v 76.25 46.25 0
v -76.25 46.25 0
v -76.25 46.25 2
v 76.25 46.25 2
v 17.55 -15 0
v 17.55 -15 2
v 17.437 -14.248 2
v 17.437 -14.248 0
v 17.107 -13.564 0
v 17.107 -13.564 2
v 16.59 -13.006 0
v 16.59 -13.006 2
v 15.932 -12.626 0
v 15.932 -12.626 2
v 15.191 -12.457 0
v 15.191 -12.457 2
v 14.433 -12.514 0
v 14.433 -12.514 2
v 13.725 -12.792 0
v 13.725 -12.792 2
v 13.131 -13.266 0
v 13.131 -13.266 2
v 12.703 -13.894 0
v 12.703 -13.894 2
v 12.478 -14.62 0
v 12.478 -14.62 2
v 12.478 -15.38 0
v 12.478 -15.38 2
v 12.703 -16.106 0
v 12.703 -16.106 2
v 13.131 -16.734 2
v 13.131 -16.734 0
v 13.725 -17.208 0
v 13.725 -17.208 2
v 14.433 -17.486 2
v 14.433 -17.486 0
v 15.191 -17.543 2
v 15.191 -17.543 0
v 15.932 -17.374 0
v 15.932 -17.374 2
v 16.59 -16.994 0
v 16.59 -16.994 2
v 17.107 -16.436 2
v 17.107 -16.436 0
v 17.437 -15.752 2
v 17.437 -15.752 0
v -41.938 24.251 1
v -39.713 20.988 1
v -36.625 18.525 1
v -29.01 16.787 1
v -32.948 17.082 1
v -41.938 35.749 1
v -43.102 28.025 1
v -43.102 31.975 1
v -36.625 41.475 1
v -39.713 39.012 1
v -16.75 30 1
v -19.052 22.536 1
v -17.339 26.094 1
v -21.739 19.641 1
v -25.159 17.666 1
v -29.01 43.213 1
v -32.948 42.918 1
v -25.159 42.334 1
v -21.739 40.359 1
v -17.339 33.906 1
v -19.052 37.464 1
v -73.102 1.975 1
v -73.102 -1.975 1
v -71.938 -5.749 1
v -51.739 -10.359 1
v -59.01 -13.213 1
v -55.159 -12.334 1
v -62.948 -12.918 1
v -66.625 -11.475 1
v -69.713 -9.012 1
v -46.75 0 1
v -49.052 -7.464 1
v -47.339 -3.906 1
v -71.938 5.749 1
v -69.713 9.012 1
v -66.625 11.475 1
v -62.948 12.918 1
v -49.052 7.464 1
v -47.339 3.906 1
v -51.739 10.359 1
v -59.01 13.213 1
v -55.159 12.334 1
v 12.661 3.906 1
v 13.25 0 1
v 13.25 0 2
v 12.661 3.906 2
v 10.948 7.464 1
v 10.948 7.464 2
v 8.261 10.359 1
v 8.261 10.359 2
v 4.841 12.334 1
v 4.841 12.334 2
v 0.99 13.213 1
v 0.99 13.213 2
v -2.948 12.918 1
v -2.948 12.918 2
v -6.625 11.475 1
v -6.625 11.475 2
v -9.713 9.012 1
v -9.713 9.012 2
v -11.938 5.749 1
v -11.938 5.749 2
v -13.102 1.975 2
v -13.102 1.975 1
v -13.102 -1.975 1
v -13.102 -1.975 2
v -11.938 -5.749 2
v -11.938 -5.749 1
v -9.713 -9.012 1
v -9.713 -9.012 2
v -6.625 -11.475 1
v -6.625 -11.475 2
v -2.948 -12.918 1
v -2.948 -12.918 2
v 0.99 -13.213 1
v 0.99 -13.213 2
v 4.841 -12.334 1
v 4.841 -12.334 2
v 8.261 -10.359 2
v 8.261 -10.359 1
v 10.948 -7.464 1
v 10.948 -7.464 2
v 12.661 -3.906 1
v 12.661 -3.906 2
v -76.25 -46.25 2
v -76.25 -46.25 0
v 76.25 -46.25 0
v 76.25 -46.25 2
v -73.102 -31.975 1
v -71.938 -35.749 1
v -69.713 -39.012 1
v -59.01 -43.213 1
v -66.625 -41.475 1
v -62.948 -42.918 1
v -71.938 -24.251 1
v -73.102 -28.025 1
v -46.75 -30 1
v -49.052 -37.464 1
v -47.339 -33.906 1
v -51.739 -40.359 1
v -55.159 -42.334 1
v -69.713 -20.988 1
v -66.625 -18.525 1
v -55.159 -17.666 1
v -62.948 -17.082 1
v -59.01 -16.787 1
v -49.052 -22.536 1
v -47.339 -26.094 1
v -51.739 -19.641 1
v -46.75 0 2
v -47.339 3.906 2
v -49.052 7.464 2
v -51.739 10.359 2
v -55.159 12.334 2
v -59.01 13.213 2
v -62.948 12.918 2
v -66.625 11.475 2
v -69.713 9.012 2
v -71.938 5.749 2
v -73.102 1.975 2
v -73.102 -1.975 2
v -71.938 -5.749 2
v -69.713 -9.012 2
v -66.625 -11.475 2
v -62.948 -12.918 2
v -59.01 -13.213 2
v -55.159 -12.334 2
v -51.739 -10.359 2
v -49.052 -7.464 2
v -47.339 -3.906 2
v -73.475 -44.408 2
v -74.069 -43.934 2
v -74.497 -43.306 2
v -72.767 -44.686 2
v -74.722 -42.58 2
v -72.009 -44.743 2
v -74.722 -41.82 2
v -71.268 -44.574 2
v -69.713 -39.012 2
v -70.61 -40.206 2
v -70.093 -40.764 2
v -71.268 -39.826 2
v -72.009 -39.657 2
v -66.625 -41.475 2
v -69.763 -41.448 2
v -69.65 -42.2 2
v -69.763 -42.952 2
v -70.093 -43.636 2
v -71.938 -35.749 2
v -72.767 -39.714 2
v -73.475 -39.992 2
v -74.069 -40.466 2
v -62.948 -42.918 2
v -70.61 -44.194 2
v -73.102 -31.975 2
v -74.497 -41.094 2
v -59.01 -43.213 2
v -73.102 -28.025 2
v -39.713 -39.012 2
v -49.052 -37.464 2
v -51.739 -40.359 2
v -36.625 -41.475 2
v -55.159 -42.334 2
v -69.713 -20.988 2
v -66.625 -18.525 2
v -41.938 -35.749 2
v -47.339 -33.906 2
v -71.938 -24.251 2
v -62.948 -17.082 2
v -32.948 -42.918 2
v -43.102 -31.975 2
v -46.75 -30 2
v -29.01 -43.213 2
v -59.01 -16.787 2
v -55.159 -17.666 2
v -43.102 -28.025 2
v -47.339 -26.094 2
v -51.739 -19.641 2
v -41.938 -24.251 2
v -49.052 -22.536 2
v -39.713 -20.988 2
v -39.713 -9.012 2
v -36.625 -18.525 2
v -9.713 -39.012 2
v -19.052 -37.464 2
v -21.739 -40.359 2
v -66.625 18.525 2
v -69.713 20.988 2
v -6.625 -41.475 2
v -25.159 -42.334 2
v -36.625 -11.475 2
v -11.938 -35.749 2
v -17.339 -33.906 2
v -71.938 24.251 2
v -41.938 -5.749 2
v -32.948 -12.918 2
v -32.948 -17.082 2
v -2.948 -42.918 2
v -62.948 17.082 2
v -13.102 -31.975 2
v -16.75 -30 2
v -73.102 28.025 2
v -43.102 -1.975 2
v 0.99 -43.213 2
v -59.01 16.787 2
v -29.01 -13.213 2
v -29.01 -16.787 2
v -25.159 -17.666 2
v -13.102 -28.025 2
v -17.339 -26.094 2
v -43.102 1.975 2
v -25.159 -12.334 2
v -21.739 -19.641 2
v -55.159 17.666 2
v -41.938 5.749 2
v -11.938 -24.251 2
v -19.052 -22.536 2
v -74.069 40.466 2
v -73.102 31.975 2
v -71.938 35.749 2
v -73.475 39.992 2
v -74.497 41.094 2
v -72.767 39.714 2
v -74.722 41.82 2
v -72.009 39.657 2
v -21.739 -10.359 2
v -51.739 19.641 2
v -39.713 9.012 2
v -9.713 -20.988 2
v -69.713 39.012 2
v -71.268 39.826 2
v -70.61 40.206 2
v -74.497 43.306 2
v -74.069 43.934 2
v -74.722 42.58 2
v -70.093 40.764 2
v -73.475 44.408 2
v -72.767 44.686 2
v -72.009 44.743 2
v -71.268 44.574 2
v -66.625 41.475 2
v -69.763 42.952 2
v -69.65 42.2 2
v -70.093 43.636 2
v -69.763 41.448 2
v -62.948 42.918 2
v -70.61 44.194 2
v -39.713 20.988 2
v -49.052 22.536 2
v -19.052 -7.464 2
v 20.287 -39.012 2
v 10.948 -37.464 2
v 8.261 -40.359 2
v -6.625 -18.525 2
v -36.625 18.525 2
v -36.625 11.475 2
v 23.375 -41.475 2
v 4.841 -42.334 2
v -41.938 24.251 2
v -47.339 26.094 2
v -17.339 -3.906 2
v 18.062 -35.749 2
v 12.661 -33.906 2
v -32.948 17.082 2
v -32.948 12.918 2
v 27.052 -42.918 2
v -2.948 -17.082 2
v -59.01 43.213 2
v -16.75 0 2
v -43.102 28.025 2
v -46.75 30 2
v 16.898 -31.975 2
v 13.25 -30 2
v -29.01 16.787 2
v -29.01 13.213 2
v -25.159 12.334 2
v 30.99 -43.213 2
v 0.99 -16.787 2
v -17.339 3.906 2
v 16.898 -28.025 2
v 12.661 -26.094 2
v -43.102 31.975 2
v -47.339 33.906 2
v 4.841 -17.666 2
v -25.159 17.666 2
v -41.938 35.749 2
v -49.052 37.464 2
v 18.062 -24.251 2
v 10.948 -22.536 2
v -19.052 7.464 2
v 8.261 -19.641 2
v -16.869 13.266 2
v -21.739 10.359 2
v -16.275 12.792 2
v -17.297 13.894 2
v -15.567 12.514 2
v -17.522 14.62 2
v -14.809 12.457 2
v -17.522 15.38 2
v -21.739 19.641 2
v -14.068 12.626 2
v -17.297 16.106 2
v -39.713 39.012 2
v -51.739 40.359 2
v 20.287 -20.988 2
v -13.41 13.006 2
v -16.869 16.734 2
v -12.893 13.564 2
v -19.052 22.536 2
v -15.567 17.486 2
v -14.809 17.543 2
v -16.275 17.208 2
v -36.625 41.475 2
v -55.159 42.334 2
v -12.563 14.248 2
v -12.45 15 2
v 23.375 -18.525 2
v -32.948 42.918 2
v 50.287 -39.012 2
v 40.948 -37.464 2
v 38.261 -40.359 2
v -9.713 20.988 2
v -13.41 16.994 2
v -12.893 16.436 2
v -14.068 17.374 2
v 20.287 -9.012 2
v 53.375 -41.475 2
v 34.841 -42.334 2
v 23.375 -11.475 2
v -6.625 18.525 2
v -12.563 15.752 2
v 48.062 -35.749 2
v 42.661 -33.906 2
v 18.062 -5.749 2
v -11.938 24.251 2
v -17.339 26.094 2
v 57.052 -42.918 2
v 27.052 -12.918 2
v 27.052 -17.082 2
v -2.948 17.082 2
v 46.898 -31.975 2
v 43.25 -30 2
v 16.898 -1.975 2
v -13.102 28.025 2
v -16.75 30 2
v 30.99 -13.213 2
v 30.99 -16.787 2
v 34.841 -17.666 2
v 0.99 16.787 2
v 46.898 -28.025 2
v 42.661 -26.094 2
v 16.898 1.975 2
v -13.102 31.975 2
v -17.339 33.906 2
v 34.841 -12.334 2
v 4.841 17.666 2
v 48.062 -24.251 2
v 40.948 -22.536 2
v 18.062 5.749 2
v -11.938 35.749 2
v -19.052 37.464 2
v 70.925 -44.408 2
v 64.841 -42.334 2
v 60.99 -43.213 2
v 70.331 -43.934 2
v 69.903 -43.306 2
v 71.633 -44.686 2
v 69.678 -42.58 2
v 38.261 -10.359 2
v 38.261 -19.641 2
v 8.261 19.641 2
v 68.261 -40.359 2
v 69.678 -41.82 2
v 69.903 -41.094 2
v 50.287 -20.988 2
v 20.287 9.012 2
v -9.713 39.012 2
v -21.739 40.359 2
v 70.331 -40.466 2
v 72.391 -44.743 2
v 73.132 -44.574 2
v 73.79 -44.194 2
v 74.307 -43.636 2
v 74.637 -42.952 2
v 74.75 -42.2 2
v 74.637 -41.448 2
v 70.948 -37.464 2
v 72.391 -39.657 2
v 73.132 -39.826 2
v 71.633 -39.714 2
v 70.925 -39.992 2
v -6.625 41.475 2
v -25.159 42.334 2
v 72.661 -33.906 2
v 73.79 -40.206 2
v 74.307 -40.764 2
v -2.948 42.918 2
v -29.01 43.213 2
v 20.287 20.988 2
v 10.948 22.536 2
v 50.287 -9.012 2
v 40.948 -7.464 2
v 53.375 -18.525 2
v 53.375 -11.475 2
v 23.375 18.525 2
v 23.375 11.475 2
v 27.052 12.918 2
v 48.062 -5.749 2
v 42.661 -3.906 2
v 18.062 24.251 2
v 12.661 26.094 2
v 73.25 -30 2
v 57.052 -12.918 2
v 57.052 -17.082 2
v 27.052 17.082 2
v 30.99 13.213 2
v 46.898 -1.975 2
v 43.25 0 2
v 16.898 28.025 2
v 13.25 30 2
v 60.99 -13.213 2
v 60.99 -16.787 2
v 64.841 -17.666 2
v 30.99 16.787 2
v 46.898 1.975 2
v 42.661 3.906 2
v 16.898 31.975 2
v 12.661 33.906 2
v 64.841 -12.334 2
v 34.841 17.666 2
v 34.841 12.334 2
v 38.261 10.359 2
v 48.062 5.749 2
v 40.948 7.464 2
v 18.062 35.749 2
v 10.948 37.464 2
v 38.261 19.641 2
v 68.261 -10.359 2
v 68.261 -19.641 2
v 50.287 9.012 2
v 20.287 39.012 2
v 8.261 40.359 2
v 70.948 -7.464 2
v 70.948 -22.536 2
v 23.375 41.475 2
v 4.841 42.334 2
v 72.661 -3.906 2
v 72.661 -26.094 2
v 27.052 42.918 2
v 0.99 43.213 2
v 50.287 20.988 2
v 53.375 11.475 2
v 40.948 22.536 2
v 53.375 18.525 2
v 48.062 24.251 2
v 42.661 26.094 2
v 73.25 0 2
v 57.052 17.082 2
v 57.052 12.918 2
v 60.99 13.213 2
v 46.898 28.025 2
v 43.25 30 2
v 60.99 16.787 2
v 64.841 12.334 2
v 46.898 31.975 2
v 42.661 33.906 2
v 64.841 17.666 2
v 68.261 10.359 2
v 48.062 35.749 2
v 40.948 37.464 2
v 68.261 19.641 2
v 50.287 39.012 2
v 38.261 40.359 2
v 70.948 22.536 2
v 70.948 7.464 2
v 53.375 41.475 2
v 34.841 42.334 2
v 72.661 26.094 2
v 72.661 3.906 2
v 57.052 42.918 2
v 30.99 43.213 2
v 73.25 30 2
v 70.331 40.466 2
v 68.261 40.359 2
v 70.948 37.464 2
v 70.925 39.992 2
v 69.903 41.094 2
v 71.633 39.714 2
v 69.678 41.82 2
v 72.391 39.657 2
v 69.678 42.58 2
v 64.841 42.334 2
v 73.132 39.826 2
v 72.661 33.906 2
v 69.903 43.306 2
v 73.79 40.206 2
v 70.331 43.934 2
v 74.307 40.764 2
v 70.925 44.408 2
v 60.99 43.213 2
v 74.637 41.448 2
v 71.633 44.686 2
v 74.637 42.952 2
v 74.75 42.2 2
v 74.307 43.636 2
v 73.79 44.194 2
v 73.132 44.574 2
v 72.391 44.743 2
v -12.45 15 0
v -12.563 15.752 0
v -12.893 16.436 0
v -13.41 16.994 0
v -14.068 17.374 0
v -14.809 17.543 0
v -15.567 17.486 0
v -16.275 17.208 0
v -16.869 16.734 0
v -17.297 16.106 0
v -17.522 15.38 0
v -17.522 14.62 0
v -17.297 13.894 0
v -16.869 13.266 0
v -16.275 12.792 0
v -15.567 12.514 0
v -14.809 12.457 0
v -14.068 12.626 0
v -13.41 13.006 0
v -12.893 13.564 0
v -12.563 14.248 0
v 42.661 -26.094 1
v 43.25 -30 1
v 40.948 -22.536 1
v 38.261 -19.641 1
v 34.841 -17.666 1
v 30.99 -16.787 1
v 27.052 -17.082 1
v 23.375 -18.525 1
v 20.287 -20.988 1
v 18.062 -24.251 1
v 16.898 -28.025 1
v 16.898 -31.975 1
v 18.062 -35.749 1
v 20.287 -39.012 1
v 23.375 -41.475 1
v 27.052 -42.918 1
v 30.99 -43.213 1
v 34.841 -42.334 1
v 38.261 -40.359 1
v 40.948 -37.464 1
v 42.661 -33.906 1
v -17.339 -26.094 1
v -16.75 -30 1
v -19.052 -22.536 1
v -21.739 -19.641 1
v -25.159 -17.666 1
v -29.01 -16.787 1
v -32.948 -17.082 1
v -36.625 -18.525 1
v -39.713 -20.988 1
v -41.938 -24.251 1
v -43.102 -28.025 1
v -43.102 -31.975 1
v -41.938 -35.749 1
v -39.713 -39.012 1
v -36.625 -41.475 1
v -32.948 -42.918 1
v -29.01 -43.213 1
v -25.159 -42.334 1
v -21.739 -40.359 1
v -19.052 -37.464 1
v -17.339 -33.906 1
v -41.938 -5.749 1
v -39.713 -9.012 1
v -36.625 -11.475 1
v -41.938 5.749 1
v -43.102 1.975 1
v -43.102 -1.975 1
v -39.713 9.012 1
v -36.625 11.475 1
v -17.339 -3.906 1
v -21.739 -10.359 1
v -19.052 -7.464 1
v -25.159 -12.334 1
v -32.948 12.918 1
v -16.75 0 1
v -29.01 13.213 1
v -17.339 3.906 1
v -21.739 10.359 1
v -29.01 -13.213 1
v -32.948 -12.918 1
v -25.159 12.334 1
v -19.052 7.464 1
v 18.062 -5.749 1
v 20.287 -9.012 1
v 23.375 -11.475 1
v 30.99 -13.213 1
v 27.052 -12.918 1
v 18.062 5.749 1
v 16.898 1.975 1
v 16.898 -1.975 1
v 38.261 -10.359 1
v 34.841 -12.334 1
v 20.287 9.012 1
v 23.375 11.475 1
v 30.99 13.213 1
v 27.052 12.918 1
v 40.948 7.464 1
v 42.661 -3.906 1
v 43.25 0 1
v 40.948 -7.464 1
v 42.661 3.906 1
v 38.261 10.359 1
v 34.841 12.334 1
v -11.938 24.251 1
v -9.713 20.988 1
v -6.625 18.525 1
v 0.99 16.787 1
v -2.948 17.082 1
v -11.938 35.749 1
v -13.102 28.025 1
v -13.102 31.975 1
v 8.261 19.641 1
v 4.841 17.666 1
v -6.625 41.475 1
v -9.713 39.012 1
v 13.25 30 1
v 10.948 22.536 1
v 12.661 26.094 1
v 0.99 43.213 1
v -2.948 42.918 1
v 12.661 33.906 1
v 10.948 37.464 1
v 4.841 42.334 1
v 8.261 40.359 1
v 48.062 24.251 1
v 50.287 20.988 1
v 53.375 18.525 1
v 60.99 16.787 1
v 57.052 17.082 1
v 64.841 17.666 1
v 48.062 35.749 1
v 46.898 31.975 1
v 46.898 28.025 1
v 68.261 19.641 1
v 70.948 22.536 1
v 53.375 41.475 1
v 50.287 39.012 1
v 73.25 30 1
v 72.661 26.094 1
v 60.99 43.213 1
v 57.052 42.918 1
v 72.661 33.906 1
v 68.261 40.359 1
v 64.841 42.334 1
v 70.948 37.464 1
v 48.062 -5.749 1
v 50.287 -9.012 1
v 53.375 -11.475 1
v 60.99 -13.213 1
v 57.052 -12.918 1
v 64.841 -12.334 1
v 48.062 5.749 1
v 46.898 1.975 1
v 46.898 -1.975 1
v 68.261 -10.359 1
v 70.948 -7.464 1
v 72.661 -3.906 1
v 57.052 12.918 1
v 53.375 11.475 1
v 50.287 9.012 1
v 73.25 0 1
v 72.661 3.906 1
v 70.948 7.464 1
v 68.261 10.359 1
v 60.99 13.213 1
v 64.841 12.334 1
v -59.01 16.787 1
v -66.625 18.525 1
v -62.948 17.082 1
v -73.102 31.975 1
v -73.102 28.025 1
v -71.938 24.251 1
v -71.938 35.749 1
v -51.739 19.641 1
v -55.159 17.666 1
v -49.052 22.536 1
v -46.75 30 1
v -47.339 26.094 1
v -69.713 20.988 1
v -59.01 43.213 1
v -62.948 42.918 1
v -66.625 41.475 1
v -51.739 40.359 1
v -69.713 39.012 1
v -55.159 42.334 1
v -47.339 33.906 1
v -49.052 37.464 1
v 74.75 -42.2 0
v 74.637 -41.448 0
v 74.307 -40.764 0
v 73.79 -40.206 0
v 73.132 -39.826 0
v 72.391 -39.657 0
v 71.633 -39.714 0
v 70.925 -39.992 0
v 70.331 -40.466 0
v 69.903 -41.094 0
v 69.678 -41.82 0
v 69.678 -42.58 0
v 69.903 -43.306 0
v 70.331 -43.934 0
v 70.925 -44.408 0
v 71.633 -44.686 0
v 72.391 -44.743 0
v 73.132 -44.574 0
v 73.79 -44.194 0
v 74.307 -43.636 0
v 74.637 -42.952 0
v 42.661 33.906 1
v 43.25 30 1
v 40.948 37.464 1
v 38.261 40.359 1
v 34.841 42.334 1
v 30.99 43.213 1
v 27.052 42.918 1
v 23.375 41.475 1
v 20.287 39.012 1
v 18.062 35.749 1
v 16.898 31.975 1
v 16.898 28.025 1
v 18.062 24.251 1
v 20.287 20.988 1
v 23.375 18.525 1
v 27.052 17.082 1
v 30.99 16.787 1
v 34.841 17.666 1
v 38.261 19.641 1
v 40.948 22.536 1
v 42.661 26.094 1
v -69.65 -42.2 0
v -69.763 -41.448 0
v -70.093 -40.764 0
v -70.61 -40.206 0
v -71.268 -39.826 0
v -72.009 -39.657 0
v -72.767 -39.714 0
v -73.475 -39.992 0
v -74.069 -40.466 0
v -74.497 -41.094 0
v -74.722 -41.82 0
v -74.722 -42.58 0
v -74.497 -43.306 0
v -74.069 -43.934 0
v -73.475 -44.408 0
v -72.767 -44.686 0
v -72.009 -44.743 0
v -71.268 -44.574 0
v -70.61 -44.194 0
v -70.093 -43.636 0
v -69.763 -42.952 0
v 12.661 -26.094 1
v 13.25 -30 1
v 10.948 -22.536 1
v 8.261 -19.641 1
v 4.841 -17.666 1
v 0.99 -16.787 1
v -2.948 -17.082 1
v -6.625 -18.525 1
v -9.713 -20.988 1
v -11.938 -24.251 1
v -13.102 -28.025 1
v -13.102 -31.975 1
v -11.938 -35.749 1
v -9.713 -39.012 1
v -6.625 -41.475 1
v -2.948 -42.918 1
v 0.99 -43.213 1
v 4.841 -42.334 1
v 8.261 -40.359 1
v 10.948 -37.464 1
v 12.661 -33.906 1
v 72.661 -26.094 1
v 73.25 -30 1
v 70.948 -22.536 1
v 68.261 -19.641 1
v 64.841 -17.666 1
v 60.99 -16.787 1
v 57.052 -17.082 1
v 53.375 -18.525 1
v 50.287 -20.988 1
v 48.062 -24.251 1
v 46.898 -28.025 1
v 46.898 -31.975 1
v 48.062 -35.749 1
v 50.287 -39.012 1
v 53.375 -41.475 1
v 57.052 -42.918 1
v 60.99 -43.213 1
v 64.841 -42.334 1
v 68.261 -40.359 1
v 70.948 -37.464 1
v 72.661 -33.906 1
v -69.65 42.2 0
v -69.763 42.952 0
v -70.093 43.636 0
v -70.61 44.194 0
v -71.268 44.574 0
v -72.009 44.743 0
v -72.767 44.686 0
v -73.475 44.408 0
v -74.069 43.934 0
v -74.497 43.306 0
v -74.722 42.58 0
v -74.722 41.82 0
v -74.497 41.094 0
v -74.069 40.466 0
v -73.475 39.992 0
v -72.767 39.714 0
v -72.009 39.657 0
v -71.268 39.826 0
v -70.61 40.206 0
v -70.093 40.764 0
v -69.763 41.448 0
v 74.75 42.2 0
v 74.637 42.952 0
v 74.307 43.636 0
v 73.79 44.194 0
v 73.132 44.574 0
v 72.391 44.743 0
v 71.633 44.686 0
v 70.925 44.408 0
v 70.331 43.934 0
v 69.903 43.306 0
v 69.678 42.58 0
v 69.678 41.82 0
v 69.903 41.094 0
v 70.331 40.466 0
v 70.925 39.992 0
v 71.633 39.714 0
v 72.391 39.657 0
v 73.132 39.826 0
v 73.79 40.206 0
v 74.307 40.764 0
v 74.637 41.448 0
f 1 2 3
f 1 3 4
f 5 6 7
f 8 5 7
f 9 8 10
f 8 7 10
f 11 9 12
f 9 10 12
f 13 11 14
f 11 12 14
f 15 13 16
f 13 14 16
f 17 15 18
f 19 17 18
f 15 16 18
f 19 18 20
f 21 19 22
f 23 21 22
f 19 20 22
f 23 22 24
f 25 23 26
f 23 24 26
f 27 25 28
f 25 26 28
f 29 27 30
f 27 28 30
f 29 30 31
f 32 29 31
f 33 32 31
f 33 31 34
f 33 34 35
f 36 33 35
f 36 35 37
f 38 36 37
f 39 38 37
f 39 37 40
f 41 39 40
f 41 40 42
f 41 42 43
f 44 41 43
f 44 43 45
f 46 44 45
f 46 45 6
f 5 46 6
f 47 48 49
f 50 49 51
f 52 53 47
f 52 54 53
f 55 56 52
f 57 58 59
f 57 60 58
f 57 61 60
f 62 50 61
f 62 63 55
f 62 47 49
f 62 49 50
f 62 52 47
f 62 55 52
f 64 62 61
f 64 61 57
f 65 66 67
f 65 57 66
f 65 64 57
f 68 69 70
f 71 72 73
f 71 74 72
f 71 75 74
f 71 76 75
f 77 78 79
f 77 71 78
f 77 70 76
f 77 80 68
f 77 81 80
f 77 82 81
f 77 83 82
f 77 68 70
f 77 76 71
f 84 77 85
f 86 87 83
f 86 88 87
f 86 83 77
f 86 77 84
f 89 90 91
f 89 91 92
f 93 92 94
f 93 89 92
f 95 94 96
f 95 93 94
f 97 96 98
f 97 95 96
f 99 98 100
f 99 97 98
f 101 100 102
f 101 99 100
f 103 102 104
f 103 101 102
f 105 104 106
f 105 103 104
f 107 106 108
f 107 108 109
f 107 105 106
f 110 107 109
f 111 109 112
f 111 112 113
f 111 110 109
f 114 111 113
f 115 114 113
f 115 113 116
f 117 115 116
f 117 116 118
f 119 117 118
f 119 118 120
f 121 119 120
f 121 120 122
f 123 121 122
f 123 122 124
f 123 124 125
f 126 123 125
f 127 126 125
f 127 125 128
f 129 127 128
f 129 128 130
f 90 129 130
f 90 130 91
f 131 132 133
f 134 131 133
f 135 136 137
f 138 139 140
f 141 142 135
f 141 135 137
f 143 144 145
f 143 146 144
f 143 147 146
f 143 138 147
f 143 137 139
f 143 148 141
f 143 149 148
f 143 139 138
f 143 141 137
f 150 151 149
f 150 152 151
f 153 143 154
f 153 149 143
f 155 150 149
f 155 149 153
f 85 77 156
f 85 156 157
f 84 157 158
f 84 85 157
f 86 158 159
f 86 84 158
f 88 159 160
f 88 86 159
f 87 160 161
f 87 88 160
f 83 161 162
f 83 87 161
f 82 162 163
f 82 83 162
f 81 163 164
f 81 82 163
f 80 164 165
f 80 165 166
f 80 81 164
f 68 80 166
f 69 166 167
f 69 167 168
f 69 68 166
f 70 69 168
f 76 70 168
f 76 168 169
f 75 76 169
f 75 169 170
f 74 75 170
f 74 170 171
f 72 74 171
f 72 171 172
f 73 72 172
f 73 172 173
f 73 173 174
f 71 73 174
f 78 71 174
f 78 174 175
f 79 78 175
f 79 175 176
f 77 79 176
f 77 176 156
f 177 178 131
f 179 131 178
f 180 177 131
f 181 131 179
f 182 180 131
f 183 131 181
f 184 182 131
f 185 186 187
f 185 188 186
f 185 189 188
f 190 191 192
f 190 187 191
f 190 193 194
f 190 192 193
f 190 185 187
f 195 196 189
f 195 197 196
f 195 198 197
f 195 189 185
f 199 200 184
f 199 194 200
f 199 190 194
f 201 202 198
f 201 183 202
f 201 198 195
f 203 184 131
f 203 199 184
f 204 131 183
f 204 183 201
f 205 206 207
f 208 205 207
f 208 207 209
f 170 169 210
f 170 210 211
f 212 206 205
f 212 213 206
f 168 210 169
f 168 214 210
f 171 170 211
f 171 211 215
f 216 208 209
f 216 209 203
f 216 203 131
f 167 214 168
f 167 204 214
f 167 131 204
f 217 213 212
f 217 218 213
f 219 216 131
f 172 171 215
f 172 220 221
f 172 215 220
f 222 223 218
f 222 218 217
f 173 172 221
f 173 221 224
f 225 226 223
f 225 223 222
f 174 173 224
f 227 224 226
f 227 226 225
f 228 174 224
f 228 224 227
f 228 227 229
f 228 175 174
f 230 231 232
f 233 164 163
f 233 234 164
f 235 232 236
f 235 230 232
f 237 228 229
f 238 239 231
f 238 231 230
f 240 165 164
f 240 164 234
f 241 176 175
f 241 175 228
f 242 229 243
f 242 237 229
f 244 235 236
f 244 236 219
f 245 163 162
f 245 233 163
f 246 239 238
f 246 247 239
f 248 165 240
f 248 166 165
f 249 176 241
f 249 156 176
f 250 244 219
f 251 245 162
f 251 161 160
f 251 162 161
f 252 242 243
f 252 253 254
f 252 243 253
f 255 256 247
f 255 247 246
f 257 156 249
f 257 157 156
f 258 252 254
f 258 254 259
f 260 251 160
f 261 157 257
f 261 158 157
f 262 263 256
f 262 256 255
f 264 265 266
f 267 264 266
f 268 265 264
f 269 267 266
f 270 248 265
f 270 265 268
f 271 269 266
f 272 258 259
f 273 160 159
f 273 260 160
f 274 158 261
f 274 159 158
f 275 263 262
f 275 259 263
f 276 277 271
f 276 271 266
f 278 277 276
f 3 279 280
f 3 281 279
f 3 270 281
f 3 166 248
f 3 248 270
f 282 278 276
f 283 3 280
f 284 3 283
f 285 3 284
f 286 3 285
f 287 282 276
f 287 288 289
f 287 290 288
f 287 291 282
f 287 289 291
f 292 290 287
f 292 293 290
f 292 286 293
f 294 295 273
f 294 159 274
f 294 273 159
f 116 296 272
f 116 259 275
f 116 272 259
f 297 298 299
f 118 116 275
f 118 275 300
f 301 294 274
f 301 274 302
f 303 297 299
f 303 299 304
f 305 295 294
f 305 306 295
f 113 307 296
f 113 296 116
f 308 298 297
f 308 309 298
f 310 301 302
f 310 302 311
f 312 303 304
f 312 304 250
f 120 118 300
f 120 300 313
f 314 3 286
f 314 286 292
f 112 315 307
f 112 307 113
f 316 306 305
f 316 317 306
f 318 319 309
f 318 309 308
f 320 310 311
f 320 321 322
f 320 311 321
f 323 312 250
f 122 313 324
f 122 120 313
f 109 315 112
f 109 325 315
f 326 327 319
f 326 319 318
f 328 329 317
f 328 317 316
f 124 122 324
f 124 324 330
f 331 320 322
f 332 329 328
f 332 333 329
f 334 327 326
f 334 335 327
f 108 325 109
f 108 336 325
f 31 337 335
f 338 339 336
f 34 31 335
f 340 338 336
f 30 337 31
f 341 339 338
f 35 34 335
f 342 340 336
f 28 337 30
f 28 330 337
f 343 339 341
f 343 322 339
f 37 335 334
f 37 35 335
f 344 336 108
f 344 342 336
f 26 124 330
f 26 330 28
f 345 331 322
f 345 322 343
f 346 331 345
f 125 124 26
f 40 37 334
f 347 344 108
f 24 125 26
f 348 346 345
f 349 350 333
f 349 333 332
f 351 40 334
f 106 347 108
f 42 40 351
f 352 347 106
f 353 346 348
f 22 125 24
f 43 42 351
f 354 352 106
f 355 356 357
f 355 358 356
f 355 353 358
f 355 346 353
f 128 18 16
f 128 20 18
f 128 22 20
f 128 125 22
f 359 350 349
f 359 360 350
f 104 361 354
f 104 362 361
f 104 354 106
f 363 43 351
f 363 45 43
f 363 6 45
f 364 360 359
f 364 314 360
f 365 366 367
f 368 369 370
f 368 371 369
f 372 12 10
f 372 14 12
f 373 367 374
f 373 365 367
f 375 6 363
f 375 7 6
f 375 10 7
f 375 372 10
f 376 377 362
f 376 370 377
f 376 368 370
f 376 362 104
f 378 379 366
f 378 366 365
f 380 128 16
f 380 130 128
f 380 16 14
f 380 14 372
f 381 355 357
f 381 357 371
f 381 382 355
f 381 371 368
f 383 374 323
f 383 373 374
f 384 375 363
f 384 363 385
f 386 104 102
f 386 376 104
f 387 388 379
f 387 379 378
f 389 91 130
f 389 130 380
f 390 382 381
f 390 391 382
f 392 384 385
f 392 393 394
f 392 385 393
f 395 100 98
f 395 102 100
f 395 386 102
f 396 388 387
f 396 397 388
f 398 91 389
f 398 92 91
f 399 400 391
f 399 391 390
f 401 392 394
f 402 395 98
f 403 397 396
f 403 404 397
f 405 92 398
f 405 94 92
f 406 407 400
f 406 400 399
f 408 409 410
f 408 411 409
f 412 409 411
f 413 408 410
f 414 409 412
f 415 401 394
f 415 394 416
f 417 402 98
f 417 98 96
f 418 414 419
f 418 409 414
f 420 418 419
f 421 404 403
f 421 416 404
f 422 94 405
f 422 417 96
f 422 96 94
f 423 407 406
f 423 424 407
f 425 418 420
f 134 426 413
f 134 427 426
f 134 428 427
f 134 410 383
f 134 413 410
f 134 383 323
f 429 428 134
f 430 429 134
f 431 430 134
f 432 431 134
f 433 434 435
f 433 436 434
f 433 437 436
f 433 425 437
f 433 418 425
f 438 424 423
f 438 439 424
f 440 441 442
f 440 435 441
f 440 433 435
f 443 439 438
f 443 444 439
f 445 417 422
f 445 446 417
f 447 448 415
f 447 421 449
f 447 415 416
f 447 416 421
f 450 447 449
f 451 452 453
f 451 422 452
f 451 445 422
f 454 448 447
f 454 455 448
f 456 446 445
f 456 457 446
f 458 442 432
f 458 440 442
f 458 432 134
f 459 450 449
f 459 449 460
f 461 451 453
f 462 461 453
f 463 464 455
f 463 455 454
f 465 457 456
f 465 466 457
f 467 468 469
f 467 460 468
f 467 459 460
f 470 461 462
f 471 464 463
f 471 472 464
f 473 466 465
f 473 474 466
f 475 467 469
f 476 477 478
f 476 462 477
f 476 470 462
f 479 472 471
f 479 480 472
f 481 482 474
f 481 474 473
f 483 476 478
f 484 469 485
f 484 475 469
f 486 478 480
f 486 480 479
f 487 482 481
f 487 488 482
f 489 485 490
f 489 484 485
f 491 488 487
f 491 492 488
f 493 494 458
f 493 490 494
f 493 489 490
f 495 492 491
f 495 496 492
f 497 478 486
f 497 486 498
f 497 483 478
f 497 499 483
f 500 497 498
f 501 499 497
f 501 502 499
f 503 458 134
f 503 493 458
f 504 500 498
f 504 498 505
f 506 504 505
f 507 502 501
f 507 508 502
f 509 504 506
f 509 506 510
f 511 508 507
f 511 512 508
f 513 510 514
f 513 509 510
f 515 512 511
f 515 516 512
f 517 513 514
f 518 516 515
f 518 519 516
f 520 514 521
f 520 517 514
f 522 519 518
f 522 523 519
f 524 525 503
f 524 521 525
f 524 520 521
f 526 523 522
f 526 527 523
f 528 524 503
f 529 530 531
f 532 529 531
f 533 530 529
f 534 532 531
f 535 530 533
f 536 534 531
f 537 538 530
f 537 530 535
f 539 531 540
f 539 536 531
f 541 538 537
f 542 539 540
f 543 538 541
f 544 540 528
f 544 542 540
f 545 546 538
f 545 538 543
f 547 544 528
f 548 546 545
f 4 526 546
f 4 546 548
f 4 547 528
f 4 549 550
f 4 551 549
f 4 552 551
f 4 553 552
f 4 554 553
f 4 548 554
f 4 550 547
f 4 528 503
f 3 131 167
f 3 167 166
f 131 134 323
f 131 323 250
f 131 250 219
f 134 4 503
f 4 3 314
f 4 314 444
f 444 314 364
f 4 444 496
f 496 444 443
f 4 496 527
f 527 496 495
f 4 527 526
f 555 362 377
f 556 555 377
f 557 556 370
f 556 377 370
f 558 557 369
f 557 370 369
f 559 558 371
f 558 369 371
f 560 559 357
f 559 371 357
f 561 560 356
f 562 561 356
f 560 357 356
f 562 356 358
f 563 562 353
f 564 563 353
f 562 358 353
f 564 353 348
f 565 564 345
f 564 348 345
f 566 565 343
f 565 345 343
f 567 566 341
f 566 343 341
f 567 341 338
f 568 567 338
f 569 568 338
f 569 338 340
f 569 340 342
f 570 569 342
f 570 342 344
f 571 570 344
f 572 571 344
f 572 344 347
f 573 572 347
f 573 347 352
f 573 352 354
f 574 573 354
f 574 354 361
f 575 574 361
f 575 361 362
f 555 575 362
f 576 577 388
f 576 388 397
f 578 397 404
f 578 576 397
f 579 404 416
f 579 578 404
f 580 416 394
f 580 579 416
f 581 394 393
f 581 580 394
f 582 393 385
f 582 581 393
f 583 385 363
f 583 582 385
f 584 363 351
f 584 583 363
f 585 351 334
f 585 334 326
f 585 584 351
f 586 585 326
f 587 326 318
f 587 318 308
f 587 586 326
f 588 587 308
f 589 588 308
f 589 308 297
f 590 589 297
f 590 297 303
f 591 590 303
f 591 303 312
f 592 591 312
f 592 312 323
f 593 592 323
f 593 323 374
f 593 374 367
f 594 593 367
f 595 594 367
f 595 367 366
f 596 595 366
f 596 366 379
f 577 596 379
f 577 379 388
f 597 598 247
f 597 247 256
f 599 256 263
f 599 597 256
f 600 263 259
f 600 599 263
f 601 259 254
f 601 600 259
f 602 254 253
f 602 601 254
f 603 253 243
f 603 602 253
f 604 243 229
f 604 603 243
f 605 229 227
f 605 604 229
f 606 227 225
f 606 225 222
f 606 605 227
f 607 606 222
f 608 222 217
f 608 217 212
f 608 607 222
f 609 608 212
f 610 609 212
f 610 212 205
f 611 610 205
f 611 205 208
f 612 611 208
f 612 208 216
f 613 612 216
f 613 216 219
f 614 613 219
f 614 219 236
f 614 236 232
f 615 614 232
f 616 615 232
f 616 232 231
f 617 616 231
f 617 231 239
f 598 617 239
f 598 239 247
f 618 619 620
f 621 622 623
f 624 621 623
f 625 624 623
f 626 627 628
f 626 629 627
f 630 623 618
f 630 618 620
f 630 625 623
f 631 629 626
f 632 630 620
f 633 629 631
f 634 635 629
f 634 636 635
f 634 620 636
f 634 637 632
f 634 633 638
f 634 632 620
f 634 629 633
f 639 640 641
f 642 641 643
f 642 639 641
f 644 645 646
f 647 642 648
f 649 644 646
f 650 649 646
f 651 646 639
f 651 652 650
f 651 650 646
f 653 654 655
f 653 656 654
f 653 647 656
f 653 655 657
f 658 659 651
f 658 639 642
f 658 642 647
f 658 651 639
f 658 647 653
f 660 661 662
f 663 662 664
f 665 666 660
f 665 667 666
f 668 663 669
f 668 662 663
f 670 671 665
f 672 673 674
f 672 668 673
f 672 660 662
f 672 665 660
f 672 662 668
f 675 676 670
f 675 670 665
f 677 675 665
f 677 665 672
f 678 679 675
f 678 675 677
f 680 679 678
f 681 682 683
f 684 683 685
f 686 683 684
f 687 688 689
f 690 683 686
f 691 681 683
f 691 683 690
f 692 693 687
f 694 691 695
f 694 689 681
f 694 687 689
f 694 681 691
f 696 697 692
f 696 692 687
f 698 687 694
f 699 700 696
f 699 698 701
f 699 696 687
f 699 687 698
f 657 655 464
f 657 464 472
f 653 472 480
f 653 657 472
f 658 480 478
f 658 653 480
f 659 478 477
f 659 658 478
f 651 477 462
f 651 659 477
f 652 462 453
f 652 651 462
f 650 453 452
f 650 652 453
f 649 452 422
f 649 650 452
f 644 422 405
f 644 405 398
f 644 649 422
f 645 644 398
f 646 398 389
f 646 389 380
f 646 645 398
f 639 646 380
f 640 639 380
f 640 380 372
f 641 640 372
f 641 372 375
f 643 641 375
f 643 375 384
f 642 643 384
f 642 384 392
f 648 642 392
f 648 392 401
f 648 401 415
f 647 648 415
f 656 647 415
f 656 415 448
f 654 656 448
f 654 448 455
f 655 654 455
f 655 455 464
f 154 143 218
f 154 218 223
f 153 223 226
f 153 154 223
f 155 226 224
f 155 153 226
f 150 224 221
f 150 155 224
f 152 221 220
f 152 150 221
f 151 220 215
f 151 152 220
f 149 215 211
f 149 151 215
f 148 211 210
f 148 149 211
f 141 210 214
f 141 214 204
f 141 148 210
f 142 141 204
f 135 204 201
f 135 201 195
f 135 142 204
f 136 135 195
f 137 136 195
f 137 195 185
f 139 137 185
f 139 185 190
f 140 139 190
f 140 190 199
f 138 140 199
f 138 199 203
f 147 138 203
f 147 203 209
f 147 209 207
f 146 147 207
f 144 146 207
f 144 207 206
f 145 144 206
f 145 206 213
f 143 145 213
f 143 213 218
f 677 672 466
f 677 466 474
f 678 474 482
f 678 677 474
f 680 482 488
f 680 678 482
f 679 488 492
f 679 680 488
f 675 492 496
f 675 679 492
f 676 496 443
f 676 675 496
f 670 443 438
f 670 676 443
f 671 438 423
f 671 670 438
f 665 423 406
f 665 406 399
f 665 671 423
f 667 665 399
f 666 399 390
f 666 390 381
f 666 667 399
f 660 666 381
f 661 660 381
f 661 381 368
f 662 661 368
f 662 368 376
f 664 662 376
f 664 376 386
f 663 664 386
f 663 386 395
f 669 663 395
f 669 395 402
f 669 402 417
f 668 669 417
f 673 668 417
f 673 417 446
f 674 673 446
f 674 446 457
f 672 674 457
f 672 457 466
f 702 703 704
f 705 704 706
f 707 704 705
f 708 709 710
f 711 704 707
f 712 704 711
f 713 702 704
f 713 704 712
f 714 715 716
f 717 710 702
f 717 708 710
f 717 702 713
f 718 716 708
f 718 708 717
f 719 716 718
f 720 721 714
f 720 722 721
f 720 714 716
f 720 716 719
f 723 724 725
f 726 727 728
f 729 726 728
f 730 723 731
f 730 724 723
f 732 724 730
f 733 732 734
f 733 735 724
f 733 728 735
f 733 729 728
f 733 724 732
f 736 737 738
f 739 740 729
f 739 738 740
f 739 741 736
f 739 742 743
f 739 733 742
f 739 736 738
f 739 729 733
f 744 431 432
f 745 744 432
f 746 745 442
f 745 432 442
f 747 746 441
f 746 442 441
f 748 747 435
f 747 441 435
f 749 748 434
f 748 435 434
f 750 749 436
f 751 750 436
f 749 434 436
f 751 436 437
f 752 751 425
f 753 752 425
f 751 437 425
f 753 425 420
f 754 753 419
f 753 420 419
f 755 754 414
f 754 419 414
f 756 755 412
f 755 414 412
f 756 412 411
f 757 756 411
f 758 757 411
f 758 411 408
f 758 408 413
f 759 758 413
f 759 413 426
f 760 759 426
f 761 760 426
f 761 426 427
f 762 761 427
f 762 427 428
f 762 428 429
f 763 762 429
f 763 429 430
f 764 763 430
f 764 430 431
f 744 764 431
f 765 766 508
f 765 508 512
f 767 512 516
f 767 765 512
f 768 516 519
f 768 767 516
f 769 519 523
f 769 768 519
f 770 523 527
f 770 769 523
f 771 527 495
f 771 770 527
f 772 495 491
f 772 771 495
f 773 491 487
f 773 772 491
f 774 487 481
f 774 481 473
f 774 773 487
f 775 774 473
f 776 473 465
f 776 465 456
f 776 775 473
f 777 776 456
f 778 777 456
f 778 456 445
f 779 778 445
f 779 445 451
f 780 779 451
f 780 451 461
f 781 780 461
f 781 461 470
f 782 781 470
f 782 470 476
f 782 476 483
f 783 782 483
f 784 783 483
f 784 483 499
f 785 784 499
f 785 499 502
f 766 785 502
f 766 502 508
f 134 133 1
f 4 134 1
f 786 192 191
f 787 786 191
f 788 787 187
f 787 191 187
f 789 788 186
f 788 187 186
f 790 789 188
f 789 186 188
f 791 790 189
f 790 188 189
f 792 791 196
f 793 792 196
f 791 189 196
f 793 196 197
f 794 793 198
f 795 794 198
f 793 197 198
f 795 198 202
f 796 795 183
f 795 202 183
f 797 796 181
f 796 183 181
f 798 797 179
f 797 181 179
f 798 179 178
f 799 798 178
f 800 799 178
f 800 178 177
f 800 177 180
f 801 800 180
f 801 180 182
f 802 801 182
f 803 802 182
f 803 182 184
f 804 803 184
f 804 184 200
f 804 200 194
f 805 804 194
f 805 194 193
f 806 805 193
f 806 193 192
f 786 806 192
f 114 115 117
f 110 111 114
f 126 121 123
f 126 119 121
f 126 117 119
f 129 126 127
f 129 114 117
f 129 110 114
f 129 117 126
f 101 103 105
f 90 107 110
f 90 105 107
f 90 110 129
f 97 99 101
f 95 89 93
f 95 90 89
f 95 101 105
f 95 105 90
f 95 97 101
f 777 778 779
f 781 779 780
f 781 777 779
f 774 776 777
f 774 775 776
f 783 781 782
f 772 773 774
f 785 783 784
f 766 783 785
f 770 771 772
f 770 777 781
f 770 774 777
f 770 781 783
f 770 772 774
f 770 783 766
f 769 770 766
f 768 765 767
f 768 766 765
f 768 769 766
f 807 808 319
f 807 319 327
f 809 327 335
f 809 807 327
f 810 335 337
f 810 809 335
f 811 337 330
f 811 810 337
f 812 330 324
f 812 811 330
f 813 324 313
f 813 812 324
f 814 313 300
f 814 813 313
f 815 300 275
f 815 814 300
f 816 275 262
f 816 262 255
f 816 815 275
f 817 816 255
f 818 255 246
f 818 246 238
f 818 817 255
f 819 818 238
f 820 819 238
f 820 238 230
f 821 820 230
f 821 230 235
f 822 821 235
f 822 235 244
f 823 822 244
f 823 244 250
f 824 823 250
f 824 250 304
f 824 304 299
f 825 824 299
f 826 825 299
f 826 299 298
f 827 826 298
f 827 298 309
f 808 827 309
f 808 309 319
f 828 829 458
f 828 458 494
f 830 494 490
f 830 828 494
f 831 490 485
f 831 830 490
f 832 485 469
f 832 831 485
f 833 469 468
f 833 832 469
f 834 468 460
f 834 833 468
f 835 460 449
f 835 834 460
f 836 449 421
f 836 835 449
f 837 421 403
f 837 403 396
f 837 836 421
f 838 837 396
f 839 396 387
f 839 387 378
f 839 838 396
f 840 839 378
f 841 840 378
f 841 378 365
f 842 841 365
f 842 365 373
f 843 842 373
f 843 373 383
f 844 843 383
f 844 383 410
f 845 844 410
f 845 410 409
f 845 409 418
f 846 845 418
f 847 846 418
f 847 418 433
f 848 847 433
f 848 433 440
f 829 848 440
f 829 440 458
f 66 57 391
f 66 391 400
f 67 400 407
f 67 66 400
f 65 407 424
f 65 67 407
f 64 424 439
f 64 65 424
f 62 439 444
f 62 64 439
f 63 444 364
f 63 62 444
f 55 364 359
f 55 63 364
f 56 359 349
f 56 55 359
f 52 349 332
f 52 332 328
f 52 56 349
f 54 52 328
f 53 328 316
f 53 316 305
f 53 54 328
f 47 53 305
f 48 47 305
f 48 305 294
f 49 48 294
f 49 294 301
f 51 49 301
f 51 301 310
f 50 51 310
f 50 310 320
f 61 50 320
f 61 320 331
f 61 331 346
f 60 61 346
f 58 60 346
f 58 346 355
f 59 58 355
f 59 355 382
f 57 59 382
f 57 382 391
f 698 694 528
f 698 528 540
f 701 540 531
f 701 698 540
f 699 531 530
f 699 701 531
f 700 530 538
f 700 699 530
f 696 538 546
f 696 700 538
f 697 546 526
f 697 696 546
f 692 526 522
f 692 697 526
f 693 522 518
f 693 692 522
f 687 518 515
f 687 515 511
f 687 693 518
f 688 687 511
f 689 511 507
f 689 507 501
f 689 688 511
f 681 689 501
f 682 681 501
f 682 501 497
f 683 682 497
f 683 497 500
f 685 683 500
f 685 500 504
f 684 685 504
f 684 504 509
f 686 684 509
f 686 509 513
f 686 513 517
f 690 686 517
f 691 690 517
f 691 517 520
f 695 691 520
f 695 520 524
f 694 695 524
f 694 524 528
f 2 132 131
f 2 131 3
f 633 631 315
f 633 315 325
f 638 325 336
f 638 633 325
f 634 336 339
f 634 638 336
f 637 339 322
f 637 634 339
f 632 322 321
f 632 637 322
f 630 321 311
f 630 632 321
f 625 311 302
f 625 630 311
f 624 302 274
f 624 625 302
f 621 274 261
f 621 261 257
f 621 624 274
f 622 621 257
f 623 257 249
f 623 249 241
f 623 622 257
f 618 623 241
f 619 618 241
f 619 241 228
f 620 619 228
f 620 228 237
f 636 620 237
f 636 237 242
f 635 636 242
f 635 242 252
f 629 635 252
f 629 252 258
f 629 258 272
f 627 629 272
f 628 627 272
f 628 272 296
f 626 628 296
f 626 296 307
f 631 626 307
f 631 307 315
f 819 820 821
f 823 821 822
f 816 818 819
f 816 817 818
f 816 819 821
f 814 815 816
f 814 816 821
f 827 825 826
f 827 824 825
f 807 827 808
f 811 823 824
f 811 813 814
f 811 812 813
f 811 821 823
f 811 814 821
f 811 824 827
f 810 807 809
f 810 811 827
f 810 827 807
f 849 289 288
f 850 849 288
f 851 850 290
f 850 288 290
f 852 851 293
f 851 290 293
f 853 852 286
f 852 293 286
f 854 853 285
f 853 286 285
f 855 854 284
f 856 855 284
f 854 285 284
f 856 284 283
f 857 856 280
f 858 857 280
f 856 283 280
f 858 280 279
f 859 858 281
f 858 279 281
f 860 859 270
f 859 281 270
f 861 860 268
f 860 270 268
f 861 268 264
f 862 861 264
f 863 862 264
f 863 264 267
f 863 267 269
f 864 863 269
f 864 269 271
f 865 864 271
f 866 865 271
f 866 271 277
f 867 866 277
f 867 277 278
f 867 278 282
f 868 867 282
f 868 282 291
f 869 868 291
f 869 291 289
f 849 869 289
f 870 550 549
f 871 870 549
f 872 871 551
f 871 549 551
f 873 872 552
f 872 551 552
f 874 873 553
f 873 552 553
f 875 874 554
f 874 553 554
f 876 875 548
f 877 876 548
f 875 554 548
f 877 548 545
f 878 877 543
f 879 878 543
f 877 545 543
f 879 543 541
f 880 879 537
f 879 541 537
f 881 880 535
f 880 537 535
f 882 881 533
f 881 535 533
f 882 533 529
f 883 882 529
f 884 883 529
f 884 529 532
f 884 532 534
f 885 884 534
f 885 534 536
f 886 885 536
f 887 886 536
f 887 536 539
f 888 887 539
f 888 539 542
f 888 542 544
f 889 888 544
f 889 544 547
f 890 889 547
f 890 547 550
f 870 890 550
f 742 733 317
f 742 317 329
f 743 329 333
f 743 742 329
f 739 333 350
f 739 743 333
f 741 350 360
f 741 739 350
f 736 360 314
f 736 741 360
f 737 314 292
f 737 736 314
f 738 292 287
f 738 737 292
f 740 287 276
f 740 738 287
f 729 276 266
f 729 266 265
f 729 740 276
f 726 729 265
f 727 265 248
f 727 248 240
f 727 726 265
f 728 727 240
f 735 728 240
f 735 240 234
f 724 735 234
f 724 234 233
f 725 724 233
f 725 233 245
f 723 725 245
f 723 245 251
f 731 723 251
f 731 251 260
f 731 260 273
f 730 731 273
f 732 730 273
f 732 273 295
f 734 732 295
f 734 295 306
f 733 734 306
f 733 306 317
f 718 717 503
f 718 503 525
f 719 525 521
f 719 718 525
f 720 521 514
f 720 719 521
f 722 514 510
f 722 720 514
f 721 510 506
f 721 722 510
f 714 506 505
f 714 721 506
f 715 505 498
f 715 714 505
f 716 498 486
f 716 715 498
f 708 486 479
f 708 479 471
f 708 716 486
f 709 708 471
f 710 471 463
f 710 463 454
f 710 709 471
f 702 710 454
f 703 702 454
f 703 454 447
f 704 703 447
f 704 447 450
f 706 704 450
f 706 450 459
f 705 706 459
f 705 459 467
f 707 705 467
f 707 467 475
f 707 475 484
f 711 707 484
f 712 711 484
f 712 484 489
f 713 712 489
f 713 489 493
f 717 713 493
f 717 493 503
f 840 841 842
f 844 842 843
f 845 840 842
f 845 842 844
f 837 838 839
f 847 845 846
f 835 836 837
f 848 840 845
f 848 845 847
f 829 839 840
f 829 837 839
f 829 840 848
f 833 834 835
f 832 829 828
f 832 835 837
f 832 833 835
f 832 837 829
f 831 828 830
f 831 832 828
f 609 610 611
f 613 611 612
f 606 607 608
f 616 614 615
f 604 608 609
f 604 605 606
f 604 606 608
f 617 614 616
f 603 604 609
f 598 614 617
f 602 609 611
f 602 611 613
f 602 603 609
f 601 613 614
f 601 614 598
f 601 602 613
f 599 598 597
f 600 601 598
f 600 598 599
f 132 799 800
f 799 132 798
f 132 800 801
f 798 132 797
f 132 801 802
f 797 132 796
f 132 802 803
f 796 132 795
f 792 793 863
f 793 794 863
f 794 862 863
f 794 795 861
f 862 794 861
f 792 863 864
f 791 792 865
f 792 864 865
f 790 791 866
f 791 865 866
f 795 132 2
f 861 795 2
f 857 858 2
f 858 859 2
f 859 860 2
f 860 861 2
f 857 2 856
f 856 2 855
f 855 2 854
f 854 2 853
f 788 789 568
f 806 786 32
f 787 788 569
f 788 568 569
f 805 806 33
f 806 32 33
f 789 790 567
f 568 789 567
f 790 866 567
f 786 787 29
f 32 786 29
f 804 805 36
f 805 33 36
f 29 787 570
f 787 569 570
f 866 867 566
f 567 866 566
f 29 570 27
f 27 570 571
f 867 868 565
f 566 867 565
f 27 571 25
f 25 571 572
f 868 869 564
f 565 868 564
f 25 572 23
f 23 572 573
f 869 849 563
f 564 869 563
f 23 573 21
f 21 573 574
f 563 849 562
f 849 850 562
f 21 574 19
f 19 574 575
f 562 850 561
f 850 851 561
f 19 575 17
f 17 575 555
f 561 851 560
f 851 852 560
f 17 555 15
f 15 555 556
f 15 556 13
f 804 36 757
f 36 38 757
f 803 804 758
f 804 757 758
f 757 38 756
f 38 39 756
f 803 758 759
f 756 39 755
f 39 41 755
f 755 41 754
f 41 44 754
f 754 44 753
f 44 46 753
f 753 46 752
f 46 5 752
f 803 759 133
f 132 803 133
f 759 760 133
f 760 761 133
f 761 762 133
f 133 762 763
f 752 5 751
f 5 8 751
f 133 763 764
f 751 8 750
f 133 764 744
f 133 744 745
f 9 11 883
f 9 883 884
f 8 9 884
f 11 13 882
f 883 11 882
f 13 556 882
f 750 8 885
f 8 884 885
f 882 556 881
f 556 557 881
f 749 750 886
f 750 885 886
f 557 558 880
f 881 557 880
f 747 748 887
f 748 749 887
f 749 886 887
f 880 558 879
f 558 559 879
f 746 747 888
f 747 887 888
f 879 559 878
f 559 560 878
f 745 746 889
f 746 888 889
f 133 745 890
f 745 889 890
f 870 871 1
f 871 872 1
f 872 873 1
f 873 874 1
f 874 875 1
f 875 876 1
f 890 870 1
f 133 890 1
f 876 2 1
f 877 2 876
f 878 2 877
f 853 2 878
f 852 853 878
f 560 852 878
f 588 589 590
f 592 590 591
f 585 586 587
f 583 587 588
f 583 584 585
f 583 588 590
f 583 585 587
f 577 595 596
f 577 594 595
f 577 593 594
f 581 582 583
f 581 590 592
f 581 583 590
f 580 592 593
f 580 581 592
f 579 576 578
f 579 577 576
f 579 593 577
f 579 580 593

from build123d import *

# Parameters (mm, degrees)
F0_W     = 152.5
F0_H     = 92.5
F0_R     = 13.25
F1_DEPTH = 1
F2_DEPTH = 2
F3_R     = 2.55
F4_DEPTH = 2.001


# Not quite as in the source:
# - a feature names something its author has since deleted; it is built from what else it names


with BuildPart() as f1:
    # F0 (on Top) → F1 (new body)
    with BuildSketch(Plane.XY):
        Rectangle(F0_W, F0_H)
        with Locations((-60, -30)):
            Circle(F0_R, mode=Mode.SUBTRACT)
        with Locations((-30, -30)):
            Circle(F0_R, mode=Mode.SUBTRACT)
        with Locations((0, -30)):
            Circle(F0_R, mode=Mode.SUBTRACT)
        with Locations((30, -30)):
            Circle(F0_R, mode=Mode.SUBTRACT)
        with Locations((60, -30)):
            Circle(F0_R, mode=Mode.SUBTRACT)
        with Locations((-60, 0)):
            Circle(F0_R, mode=Mode.SUBTRACT)
        with Locations((-30, 0)):
            Circle(F0_R, mode=Mode.SUBTRACT)
        with Locations((-60, 30)):
            Circle(F0_R, mode=Mode.SUBTRACT)
        with Locations((-30, 30)):
            Circle(F0_R, mode=Mode.SUBTRACT)
        Circle(F0_R, mode=Mode.SUBTRACT)
        with Locations((30, 0)):
            Circle(F0_R, mode=Mode.SUBTRACT)
        with Locations((60, 0)):
            Circle(F0_R, mode=Mode.SUBTRACT)
        with Locations((0, 30)):
            Circle(F0_R, mode=Mode.SUBTRACT)
        with Locations((30, 30)):
            Circle(F0_R, mode=Mode.SUBTRACT)
        with Locations((60, 30)):
            Circle(F0_R, mode=Mode.SUBTRACT)
        with Locations((-60, 30)):
            Circle(F0_R)
        with Locations((-30, 30)):
            Circle(F0_R)
        with Locations((0, 30)):
            Circle(F0_R)
        with Locations((30, 30)):
            Circle(F0_R)
        with Locations((60, 30)):
            Circle(F0_R)
        with Locations((60, 0)):
            Circle(F0_R)
        with Locations((30, 0)):
            Circle(F0_R)
        with Locations((-30, 0)):
            Circle(F0_R)
        with Locations((-60, 0)):
            Circle(F0_R)
        Circle(F0_R)
        with Locations((0, -30)):
            Circle(F0_R)
        with Locations((-30, -30)):
            Circle(F0_R)
        with Locations((-60, -30)):
            Circle(F0_R)
        with Locations((30, -30)):
            Circle(F0_R)
        with Locations((60, -30)):
            Circle(F0_R)
    extrude(amount=F1_DEPTH)

    # F0 (on Top) → F2 (join)
    with BuildSketch(Plane.XY):
        Rectangle(F0_W, F0_H)
        with Locations((-60, -30)):
            Circle(F0_R, mode=Mode.SUBTRACT)
        with Locations((-30, -30)):
            Circle(F0_R, mode=Mode.SUBTRACT)
        with Locations((0, -30)):
            Circle(F0_R, mode=Mode.SUBTRACT)
        with Locations((30, -30)):
            Circle(F0_R, mode=Mode.SUBTRACT)
        with Locations((60, -30)):
            Circle(F0_R, mode=Mode.SUBTRACT)
        with Locations((-60, 0)):
            Circle(F0_R, mode=Mode.SUBTRACT)
        with Locations((-30, 0)):
            Circle(F0_R, mode=Mode.SUBTRACT)
        with Locations((-60, 30)):
            Circle(F0_R, mode=Mode.SUBTRACT)
        with Locations((-30, 30)):
            Circle(F0_R, mode=Mode.SUBTRACT)
        Circle(F0_R, mode=Mode.SUBTRACT)
        with Locations((30, 0)):
            Circle(F0_R, mode=Mode.SUBTRACT)
        with Locations((60, 0)):
            Circle(F0_R, mode=Mode.SUBTRACT)
        with Locations((0, 30)):
            Circle(F0_R, mode=Mode.SUBTRACT)
        with Locations((30, 30)):
            Circle(F0_R, mode=Mode.SUBTRACT)
        with Locations((60, 30)):
            Circle(F0_R, mode=Mode.SUBTRACT)
    extrude(amount=F2_DEPTH)

    # F3 (on face) → F4 (cut, through all)
    with BuildSketch(Plane.XY.offset(2)):
        with Locations((-72.2, 42.2)):
            Circle(F3_R)
        with Locations((72.2, 42.2)):
            Circle(F3_R)
        with Locations((-72.2, -42.2)):
            Circle(F3_R)
        with Locations((72.2, -42.2)):
            Circle(F3_R)
        with Locations((15, -15)):
            Circle(F3_R)
        with Locations((-15, 15)):
            Circle(F3_R)
    extrude(amount=-F4_DEPTH, mode=Mode.SUBTRACT)


solid = f1.part
